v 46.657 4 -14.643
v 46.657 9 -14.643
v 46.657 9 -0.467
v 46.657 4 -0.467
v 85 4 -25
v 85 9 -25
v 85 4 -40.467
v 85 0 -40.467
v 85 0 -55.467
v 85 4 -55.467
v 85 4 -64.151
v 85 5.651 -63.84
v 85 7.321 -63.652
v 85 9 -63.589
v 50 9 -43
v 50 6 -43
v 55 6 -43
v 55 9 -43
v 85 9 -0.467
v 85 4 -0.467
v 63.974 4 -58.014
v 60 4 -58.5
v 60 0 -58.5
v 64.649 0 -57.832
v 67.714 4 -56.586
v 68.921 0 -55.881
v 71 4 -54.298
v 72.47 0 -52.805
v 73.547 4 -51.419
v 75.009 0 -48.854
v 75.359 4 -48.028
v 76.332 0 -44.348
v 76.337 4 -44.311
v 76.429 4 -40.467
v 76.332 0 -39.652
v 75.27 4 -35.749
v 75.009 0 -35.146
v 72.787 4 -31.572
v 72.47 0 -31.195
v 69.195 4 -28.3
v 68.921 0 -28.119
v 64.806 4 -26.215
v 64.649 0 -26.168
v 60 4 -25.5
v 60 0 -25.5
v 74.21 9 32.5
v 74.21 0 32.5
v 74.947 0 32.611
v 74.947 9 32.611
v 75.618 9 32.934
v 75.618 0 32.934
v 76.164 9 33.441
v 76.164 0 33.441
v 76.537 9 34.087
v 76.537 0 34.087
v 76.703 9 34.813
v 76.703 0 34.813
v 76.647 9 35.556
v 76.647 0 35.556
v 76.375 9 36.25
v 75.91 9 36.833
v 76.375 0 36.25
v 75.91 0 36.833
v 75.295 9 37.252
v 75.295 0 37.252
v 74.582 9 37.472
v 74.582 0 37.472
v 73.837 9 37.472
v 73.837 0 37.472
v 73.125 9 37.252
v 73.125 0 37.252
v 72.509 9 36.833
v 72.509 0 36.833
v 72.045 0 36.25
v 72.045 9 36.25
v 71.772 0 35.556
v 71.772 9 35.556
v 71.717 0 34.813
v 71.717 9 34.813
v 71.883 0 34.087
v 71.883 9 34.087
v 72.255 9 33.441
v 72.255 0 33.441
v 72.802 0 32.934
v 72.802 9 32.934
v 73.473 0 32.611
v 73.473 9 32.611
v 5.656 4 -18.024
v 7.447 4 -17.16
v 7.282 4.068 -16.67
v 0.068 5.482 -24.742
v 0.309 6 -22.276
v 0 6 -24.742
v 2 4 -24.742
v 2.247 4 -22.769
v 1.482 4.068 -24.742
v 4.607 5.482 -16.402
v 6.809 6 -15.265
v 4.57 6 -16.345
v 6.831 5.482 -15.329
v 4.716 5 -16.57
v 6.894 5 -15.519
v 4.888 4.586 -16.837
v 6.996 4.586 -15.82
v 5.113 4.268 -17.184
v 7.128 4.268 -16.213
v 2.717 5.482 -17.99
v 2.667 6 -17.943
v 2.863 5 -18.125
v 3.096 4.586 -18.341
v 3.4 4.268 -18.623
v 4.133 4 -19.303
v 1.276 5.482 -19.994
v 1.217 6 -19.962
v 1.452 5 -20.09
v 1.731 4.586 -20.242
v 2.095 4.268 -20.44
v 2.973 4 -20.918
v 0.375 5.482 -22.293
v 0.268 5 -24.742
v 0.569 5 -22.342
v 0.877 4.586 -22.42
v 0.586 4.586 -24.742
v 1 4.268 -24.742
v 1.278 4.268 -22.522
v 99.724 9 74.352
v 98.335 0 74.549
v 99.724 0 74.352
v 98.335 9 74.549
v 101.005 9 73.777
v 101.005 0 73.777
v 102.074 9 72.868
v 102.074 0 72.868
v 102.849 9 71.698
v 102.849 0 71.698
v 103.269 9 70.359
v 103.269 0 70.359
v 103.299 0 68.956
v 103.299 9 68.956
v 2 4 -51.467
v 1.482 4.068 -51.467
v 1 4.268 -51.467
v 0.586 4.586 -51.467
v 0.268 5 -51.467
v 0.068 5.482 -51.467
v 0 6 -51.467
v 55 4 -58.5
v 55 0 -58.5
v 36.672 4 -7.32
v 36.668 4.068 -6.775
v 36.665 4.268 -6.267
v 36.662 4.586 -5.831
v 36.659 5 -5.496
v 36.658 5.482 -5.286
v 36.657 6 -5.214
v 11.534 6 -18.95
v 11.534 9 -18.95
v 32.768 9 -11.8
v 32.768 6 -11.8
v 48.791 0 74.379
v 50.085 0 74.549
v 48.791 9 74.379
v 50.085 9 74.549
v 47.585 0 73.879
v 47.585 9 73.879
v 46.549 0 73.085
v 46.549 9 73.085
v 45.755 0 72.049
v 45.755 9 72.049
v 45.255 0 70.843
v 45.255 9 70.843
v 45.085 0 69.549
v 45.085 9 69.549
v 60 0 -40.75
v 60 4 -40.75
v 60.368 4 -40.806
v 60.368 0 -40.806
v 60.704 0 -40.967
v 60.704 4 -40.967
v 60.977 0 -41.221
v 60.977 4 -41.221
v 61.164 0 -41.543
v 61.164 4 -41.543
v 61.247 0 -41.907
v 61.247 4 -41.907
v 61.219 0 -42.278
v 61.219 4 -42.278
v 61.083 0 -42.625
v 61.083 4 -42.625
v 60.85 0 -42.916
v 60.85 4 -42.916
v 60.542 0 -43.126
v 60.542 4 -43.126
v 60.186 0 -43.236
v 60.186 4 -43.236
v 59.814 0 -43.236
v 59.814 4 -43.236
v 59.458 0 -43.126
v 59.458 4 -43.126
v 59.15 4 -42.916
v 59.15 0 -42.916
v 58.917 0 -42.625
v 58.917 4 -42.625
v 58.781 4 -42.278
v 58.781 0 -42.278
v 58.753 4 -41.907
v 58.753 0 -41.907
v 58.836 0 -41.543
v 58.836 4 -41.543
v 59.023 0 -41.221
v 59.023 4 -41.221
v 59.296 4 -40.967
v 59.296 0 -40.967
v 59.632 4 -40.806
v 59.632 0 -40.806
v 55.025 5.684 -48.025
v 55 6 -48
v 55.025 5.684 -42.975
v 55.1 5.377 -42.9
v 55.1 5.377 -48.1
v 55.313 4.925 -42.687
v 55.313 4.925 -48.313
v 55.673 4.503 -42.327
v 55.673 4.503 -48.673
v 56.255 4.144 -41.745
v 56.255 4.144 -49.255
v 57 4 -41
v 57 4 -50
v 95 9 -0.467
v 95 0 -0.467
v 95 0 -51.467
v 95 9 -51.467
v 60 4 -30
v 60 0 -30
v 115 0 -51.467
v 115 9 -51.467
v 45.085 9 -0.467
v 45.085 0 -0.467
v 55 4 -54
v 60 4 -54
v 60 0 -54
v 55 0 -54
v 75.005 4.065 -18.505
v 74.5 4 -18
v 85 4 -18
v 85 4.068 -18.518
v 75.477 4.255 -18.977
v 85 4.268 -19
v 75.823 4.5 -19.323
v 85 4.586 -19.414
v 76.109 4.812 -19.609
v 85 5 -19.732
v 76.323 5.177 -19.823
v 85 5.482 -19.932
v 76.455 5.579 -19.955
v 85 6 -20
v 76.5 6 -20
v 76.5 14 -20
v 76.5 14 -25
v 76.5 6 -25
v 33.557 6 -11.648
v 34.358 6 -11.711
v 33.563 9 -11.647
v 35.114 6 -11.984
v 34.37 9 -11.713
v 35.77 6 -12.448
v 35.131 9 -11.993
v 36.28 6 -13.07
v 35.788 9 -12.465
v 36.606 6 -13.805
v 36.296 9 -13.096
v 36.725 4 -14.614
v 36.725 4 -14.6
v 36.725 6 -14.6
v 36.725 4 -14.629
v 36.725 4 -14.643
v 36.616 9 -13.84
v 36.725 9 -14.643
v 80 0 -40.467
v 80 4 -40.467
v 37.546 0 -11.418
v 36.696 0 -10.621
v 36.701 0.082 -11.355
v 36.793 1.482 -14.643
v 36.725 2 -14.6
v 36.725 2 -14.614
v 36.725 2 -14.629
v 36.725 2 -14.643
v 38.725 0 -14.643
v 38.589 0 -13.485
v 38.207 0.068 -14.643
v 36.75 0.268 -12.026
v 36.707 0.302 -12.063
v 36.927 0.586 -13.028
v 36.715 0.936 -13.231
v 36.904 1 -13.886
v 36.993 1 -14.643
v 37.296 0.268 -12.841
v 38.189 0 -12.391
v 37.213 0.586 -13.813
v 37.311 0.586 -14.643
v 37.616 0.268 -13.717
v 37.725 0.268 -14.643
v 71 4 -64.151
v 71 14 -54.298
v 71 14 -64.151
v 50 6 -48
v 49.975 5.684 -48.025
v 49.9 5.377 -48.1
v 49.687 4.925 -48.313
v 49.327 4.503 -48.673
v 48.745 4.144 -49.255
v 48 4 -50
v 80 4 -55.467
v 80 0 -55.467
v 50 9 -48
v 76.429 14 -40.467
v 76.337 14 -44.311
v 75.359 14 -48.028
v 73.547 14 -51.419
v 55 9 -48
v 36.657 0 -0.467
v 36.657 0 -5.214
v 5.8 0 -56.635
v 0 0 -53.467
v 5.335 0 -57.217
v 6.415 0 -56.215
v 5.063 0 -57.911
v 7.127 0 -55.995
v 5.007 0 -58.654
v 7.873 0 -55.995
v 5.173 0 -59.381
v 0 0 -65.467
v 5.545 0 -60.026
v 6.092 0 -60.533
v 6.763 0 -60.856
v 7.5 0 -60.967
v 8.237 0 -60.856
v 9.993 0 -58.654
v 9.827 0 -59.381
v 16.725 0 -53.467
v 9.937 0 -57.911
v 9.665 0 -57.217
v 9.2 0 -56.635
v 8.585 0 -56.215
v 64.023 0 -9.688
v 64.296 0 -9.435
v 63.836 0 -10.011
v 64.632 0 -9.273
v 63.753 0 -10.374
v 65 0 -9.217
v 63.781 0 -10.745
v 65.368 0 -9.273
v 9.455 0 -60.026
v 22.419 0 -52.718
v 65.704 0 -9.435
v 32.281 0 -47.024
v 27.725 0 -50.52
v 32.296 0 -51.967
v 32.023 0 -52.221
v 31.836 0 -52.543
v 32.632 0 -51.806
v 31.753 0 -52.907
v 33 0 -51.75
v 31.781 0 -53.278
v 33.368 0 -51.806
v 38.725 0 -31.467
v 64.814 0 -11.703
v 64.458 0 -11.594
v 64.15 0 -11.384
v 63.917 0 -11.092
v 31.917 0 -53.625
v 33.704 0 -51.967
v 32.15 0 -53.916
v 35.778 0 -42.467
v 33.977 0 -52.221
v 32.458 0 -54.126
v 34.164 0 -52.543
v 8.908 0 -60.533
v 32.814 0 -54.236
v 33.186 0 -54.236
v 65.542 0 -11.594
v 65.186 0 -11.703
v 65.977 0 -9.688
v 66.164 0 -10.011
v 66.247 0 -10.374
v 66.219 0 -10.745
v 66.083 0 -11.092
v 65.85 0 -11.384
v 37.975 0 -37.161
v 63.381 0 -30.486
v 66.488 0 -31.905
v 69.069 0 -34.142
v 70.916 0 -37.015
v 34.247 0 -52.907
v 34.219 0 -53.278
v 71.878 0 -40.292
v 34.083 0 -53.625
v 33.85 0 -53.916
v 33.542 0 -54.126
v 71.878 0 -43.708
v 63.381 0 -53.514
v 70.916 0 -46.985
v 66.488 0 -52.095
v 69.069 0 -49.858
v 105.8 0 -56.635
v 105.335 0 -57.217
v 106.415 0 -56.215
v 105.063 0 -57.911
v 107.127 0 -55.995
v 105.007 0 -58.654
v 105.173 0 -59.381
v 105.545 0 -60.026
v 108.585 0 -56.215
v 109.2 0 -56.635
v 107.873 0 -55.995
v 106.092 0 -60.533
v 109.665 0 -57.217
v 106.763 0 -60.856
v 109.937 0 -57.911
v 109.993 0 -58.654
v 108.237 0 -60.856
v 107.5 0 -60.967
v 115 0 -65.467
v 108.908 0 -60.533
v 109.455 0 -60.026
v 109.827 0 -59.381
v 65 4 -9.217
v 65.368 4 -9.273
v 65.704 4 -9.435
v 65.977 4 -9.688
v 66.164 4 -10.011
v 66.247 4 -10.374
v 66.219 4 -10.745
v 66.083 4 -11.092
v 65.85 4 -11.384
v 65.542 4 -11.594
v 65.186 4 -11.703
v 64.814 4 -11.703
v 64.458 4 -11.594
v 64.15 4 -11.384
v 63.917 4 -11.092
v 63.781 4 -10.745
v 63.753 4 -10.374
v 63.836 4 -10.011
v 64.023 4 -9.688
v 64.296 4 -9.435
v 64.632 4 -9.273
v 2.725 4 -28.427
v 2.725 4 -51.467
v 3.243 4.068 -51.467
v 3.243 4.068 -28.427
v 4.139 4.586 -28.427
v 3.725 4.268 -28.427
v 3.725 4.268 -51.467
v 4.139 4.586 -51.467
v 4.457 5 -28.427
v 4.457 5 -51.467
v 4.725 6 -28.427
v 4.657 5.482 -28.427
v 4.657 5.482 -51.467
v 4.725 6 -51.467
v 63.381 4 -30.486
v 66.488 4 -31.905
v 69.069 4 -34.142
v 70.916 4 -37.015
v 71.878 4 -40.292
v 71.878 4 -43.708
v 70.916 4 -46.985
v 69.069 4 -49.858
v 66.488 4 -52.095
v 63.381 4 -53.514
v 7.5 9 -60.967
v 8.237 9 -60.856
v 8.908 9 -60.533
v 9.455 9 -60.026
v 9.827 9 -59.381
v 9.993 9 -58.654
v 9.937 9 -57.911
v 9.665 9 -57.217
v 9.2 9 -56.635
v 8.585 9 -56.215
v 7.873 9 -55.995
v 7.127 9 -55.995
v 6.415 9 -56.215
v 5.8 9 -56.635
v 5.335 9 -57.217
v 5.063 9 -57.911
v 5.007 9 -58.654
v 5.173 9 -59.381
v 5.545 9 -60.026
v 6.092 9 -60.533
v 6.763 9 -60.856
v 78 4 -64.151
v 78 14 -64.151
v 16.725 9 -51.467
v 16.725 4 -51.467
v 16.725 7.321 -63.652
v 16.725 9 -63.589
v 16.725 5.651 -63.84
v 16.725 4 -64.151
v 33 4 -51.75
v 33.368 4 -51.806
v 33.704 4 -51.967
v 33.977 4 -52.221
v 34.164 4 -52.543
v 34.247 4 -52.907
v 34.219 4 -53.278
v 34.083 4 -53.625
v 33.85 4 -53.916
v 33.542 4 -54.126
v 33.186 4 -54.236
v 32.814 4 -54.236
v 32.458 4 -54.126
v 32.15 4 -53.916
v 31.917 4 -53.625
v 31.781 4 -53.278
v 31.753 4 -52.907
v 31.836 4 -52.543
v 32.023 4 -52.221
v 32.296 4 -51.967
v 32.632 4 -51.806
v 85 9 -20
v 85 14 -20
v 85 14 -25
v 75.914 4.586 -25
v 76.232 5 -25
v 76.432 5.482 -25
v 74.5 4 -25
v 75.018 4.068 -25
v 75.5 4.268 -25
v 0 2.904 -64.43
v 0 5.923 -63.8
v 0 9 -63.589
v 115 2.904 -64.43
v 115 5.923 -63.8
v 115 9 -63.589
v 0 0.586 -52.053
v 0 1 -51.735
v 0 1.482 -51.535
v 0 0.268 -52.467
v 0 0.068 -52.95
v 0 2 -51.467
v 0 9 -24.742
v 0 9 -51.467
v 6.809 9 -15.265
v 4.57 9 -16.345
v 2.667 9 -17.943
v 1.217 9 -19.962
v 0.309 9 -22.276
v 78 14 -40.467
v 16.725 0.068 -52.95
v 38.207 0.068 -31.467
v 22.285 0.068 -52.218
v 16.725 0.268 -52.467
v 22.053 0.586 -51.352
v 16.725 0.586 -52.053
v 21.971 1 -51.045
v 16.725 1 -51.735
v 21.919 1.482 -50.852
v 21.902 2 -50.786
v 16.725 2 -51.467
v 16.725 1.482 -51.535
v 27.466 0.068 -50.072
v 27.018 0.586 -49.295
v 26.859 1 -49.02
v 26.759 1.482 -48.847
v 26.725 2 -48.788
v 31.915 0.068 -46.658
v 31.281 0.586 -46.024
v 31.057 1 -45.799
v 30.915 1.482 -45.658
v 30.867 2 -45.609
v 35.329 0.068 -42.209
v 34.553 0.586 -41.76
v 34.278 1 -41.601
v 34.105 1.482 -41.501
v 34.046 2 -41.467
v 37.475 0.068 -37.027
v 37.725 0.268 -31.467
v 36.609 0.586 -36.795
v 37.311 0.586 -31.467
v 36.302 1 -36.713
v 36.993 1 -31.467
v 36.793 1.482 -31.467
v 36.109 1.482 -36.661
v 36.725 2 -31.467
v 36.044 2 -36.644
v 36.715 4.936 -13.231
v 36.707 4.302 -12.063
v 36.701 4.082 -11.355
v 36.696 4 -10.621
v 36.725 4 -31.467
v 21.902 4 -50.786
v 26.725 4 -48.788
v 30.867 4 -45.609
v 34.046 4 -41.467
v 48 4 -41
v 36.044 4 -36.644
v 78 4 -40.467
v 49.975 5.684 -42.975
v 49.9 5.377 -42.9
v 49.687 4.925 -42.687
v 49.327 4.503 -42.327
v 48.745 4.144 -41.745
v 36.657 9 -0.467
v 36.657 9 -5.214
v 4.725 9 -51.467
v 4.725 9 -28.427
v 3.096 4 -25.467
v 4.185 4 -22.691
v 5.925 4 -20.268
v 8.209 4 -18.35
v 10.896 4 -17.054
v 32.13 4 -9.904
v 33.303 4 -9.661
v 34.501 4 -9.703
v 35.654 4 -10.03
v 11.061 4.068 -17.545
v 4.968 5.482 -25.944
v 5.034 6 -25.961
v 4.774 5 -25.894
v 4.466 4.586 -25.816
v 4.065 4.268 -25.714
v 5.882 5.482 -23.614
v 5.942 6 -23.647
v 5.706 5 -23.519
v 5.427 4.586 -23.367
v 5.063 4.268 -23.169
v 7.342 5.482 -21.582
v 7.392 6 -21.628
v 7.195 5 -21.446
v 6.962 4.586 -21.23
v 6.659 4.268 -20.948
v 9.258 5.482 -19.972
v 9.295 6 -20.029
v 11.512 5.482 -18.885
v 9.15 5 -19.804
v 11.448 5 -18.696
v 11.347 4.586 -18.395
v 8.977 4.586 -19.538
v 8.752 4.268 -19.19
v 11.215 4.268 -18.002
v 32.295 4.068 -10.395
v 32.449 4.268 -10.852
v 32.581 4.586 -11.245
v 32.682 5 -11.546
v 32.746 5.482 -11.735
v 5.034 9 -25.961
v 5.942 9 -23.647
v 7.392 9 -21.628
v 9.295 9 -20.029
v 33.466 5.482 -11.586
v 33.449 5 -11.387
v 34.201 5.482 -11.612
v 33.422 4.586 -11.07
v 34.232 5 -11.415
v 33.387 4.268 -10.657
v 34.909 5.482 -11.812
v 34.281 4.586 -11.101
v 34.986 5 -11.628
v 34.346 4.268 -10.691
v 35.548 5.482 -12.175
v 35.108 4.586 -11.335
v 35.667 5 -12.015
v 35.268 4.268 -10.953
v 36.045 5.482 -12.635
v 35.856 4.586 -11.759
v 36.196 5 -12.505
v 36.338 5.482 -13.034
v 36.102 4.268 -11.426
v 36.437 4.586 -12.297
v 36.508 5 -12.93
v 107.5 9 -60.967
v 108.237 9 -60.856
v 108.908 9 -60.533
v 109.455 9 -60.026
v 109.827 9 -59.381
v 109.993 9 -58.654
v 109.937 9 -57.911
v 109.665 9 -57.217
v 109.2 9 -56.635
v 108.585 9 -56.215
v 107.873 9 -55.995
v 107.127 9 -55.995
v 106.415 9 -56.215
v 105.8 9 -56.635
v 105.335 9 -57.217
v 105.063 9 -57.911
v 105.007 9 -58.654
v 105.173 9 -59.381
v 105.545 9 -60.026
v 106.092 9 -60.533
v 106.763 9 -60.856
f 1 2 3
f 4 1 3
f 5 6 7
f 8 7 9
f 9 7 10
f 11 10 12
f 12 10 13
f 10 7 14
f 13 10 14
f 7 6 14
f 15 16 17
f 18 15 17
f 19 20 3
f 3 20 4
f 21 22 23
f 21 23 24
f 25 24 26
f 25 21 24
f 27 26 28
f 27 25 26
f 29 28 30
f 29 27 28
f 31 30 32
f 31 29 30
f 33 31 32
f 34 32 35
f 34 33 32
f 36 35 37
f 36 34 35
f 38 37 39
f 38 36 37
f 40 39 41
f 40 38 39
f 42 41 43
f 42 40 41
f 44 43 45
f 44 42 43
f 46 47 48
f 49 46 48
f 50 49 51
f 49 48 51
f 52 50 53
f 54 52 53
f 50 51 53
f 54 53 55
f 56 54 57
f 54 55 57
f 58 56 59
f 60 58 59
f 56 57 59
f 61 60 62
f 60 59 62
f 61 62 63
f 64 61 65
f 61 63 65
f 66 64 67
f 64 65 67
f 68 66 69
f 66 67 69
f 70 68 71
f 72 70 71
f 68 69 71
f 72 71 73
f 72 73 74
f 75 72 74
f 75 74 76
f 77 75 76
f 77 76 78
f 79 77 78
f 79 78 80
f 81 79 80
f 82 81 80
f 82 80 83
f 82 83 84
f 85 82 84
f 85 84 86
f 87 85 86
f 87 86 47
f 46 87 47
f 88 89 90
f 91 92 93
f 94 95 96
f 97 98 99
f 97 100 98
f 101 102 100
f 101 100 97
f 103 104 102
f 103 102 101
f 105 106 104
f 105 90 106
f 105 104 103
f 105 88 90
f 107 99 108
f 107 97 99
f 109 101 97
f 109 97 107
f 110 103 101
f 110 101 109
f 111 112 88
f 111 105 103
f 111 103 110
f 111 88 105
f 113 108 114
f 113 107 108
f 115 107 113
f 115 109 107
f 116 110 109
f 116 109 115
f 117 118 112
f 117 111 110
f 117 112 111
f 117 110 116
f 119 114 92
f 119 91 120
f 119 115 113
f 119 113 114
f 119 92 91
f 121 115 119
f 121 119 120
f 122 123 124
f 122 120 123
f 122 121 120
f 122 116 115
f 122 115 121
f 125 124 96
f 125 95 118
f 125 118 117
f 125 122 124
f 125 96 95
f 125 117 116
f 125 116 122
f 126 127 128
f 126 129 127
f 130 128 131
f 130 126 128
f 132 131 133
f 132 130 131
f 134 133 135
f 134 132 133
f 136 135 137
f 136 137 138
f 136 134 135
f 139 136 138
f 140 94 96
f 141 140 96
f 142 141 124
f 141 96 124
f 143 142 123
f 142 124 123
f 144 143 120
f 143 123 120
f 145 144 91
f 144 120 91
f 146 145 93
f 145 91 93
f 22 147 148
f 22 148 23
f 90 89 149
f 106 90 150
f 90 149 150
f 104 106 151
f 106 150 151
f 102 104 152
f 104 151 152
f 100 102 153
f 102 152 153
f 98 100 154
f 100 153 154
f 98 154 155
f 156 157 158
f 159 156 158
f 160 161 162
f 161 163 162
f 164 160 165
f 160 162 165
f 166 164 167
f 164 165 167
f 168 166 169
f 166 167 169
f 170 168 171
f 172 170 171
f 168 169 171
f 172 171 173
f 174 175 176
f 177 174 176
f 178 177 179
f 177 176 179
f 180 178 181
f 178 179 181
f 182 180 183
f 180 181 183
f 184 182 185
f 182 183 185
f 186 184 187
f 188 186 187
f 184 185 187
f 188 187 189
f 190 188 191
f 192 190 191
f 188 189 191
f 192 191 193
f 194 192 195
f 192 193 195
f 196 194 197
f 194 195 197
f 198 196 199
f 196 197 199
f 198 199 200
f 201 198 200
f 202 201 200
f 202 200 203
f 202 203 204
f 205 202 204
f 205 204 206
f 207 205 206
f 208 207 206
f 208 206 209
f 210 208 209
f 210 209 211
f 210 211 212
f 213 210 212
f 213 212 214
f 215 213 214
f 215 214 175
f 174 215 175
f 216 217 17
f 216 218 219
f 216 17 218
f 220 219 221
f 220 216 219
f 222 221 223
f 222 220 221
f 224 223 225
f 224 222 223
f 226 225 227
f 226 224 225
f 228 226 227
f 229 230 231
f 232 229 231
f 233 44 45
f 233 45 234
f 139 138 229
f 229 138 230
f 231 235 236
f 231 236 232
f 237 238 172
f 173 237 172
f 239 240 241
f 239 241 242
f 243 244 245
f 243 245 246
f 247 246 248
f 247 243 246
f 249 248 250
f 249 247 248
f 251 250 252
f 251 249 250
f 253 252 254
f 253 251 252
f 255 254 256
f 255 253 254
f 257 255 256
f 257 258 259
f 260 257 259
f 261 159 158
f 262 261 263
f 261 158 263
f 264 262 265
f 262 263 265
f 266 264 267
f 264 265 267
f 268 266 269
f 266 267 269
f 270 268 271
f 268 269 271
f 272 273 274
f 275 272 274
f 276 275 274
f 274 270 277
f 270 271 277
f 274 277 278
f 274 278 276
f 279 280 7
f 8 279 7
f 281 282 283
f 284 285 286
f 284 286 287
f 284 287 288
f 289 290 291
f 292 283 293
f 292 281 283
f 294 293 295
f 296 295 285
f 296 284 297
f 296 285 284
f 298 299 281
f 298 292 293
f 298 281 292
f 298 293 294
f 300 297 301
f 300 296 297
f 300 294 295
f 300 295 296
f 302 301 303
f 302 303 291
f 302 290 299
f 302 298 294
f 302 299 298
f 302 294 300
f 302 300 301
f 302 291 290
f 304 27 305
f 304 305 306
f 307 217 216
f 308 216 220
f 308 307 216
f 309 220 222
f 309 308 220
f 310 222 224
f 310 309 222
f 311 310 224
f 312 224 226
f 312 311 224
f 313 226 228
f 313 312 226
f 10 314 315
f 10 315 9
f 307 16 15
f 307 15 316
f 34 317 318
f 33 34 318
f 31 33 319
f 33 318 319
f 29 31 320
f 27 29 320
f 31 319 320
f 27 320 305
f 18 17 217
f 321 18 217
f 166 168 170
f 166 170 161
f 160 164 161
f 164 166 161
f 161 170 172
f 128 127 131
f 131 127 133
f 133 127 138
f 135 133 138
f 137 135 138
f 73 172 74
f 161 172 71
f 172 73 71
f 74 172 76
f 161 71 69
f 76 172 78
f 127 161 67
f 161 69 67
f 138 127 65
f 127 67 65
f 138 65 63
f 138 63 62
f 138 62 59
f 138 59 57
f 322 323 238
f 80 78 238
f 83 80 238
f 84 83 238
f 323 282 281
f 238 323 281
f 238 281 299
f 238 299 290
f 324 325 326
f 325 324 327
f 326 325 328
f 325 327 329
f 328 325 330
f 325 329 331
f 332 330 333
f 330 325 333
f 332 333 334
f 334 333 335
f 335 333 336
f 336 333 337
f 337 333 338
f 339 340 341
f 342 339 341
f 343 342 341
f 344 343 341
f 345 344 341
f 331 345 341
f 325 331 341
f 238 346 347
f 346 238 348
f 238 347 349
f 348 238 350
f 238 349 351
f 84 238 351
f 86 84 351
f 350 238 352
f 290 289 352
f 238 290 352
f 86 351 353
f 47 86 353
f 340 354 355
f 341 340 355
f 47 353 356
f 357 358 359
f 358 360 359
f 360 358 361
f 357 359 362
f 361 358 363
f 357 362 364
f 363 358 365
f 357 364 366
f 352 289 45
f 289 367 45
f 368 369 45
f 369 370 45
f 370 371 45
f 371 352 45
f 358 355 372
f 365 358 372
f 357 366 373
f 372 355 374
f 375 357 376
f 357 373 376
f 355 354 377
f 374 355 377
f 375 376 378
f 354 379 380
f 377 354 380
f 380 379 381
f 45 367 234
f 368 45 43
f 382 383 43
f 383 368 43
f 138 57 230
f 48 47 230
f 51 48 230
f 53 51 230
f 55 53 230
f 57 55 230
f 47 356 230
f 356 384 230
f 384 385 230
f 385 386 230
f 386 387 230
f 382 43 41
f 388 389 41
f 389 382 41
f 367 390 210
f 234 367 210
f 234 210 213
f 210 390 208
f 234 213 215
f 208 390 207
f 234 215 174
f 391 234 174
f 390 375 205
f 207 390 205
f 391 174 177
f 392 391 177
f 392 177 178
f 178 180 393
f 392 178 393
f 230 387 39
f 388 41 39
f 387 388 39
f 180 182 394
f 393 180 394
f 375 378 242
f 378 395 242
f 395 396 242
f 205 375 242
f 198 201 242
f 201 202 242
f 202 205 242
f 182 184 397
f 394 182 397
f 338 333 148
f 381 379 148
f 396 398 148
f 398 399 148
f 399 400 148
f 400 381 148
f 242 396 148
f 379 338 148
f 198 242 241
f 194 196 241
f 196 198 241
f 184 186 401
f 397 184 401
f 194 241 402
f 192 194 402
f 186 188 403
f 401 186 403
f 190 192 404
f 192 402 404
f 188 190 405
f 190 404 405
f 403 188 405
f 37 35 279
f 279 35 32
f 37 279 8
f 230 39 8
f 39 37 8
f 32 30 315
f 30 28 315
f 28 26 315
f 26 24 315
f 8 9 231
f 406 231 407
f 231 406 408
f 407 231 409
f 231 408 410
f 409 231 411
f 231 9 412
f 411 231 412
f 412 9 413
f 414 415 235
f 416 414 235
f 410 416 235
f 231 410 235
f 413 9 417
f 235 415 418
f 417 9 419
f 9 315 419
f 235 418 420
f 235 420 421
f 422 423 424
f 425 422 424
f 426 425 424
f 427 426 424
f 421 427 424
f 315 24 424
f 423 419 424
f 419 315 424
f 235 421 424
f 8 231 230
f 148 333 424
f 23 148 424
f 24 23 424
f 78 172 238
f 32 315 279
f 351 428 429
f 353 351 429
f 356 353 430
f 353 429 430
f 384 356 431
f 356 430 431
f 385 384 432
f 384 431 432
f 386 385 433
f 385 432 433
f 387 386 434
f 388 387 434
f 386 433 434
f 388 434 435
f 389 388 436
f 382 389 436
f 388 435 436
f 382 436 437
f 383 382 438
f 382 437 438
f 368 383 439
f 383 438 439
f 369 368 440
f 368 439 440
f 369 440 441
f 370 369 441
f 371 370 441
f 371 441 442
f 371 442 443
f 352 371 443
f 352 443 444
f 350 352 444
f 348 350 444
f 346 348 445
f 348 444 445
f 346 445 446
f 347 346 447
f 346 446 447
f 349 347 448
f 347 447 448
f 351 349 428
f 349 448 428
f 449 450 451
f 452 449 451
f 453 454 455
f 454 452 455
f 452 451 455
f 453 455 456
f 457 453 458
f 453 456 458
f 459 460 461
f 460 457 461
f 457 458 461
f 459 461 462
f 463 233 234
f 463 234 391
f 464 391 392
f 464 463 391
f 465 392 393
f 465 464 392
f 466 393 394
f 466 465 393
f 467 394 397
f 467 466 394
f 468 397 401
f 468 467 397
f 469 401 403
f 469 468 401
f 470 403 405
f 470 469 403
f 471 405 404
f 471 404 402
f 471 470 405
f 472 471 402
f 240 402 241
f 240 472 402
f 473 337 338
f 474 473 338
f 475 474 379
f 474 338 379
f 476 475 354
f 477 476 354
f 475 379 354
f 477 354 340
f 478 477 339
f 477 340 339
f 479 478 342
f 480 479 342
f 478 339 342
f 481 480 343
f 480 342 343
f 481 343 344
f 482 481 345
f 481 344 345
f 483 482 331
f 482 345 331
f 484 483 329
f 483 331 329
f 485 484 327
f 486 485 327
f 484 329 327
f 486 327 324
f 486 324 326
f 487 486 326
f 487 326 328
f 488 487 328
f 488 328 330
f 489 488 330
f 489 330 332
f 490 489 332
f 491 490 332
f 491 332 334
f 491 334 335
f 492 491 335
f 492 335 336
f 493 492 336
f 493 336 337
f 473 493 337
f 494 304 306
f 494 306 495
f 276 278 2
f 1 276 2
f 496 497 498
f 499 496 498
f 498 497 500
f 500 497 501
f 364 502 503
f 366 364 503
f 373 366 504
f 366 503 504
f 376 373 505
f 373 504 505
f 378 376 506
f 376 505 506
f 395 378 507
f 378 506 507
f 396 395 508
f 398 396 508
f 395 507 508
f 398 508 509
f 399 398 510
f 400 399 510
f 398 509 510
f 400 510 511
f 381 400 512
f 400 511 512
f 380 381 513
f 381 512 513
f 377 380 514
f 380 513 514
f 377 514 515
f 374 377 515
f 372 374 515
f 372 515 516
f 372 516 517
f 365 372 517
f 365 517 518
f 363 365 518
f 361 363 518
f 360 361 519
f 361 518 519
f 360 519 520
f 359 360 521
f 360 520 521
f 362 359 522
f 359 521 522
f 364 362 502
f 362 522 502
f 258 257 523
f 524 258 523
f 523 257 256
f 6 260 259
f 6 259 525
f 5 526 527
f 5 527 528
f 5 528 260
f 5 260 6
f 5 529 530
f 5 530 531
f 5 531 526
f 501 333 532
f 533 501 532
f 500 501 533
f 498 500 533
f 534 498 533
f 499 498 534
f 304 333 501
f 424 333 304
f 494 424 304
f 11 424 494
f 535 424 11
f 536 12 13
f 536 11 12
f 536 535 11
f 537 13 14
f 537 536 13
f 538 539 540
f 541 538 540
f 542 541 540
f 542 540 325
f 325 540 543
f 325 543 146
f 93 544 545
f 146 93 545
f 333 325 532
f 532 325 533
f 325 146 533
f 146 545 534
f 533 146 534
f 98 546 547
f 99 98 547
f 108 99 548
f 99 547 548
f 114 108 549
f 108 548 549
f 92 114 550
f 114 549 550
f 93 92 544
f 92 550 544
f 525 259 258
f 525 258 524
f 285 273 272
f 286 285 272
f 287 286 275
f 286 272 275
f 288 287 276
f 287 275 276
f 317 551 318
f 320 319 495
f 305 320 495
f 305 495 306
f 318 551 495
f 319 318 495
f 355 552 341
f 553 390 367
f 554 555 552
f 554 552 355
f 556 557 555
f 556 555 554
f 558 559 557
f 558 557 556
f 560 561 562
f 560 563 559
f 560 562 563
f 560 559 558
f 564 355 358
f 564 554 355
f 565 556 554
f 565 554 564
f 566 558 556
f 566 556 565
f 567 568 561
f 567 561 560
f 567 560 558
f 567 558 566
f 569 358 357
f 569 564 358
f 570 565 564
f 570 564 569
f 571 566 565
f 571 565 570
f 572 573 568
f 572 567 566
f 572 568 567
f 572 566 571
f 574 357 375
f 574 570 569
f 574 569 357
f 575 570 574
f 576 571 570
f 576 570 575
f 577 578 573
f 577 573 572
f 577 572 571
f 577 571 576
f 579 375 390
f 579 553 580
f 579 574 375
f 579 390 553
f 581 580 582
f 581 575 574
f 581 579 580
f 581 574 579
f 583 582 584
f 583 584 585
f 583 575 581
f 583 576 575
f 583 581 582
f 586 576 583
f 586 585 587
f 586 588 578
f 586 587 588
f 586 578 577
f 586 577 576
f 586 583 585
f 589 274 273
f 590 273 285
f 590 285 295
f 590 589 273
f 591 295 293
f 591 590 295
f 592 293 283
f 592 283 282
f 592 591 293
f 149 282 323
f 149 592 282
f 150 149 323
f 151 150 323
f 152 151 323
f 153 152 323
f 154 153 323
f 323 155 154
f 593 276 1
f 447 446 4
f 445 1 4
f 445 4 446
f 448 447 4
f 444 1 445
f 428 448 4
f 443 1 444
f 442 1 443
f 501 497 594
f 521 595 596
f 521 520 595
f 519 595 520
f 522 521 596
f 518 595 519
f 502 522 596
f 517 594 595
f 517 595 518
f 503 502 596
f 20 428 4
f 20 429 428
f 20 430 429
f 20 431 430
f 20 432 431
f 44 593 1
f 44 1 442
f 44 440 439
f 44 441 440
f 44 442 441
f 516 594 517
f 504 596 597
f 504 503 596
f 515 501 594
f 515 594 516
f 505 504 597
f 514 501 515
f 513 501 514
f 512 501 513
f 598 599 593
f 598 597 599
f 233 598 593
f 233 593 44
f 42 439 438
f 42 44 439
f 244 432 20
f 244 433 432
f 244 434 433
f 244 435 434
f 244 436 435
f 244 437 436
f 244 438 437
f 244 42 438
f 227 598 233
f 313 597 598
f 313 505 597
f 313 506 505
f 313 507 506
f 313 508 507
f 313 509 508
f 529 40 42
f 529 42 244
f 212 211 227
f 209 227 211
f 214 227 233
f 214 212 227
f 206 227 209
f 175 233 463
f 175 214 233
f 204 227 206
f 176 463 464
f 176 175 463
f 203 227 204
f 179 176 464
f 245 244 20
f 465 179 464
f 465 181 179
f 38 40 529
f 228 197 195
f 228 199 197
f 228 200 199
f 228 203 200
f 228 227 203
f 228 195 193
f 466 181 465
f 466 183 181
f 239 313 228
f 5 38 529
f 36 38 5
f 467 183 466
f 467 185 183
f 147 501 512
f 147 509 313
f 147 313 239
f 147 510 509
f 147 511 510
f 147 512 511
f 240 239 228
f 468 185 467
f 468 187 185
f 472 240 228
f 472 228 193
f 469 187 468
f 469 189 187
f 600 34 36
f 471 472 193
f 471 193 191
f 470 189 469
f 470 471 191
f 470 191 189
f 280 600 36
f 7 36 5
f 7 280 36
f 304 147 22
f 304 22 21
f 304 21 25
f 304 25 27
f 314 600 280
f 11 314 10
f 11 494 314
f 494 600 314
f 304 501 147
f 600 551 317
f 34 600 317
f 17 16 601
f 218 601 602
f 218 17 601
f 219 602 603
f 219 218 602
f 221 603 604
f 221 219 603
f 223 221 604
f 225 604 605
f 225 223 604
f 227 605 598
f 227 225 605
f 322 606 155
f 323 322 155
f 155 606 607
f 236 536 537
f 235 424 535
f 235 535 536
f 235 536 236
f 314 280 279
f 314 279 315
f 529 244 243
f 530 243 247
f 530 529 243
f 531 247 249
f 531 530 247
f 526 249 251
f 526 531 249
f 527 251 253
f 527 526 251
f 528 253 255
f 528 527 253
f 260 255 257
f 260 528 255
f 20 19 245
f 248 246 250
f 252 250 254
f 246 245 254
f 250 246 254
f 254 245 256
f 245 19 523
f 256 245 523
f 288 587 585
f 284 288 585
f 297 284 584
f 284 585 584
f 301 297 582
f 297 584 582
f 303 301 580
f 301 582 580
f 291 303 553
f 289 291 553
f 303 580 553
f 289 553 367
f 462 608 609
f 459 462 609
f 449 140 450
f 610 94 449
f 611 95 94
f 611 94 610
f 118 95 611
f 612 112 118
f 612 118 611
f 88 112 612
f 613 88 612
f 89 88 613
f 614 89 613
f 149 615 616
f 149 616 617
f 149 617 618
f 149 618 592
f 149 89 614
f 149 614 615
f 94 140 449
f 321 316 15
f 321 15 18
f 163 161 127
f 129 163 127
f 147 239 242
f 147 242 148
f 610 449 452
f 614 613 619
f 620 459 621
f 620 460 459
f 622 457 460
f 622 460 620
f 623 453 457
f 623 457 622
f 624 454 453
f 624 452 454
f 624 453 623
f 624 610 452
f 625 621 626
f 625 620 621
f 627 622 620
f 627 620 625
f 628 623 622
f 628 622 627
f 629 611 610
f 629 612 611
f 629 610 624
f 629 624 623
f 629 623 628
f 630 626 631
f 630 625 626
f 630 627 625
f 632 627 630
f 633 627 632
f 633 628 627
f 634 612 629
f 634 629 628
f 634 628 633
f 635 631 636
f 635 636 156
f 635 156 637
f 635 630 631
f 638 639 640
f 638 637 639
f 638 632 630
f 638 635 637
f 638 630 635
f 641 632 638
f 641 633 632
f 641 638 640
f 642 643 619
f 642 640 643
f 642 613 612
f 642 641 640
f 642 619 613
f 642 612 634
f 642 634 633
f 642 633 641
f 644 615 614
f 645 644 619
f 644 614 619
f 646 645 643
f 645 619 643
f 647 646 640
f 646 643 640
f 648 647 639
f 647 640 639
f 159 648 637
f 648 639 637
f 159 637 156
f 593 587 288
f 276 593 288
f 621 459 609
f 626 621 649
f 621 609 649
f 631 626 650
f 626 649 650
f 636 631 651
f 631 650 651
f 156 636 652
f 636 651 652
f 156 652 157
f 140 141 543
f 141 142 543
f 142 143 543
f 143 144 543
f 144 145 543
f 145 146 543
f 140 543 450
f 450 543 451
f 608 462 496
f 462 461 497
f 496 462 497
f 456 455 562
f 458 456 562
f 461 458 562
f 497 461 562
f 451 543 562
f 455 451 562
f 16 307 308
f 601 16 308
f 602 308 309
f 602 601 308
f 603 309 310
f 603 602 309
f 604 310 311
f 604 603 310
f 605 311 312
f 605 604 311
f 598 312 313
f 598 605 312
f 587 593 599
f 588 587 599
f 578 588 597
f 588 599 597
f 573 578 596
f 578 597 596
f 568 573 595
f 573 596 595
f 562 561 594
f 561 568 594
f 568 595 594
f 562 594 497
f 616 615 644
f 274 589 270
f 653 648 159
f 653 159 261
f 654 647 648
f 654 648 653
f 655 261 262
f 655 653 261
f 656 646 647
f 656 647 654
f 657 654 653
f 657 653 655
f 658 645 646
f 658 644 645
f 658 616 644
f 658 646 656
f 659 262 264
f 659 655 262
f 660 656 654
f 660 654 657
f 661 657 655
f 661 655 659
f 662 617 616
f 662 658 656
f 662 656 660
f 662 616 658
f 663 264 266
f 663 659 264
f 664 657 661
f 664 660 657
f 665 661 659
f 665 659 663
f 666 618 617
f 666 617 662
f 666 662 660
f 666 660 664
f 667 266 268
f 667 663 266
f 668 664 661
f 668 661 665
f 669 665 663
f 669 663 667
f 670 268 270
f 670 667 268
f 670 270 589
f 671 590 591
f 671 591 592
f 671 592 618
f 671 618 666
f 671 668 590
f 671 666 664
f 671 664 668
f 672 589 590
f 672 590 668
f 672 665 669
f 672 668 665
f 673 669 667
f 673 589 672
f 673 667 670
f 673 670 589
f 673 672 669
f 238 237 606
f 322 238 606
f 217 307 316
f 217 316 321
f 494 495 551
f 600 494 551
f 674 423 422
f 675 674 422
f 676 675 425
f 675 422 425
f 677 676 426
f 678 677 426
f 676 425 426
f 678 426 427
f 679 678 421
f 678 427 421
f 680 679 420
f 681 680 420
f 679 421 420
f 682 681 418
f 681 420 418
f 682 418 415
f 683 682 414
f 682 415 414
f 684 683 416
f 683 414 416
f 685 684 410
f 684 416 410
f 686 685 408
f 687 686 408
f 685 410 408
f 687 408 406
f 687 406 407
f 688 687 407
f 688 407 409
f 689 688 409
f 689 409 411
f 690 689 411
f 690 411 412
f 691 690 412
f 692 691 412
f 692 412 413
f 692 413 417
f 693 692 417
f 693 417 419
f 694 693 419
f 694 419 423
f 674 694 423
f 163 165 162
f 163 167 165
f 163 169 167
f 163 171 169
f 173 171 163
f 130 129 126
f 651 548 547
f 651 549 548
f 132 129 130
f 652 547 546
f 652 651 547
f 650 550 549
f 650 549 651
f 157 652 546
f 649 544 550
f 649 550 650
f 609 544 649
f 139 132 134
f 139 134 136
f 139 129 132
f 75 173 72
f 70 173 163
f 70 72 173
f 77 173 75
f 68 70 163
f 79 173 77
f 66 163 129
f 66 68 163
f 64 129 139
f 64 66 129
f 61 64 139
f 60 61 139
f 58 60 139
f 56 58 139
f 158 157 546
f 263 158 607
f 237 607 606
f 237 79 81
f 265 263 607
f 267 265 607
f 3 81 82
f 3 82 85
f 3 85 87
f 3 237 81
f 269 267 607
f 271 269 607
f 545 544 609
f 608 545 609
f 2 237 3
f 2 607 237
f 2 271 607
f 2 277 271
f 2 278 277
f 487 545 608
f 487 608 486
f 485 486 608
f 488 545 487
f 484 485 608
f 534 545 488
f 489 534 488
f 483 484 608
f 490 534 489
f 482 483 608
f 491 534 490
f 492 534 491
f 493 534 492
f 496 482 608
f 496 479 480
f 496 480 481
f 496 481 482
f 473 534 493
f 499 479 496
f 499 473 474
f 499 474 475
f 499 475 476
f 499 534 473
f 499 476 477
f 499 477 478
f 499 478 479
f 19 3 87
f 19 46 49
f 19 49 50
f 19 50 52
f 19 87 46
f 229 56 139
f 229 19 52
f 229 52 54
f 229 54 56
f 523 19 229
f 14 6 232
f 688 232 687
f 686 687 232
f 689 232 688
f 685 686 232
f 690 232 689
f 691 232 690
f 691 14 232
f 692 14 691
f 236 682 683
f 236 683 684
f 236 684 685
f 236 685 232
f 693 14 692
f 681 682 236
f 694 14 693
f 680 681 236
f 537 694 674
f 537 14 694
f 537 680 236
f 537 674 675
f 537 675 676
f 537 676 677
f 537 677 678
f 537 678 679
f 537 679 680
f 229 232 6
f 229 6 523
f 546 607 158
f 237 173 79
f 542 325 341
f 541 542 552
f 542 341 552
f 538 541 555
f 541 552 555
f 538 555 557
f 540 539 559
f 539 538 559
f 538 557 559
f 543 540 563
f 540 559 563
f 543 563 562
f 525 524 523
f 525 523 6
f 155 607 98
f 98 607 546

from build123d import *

# Parameters (mm, degrees)
SALIENTE_EXTRUIR1_DEPTH  = 4
REDONDEO1_R              = 20
REDONDEO2_R              = 10
REDONDEO3_R              = 3
CROQUIS2_R               = 1.25
CORTAR_EXTRUIR1_DEPTH    = 4
SALIENTE_EXTRUIR2_DEPTH  = 9
CROQUIS4_W               = 16.725121099
CROQUIS4_H               = 14
SALIENTE_EXTRUIR3_DEPTH  = 5
SALIENTE_EXTRUIR4_DEPTH  = 5
CORTAR_EXTRUIR2_START    = -4
CORTAR_EXTRUIR2_DEPTH    = 4
SALIENTE_EXTRUIR8_DEPTH  = 9
REDONDEO4_R              = 5
CORTAR_EXTRUIR3_DEPTH    = 115
CROQUIS11_R              = 2.5
CORTAR_EXTRUIR4_DEPTH    = 10
CROQUIS12_W              = 5
CROQUIS12_H              = 5
SALIENTE_EXTRUIR9_DEPTH  = 5
CROQUIS13_R              = 1.25
CROQUIS13_W              = 5
CROQUIS13_H              = 15
CORTAR_EXTRUIR5_DEPTH    = 10
SALIENTE_EXTRUIR10_START = 10
CROQUIS14_W              = 8.5
CROQUIS14_H              = 5
SALIENTE_EXTRUIR10_DEPTH = 10
REDONDEO5_R              = 2


with BuildPart() as part:
    # Croquis1 → Saliente-Extruir1 (new body)
    with BuildSketch(Plane(origin=(0, 0, 0), x_dir=(1, 0, 0), z_dir=(0, 1, 0))):
        Polygon((36.657146199, 0.467319271), (95, 0.467319271), (95, 65.467319271), (0, 65.467319271), (0, 17.557539605), (36.657146199, 5.214366653), align=None)
        Polygon((4.725121099, 51.467319271), (36.725121099, 51.467319271), (36.725121099, 10.467319271), (4.725121099, 21.242340663), align=None, mode=Mode.SUBTRACT)
    extrude(amount=SALIENTE_EXTRUIR1_DEPTH)

    # Redondeo1
    redondeo1_edges = [part.edges().sort_by_distance(p)[0] for p in [
        (36.725121099, 2, -51.467319271),
    ]]
    fillet(redondeo1_edges, radius=REDONDEO1_R)

    # Redondeo2
    redondeo2_edges = [part.edges().sort_by_distance(p)[0] for p in [
        (0, 2, -17.557539605),
        (4.725121099, 2, -21.242340663),
    ]]
    fillet(redondeo2_edges, radius=REDONDEO2_R)

    # Redondeo3
    redondeo3_edges = [part.edges().sort_by_distance(p)[0] for p in [
        (36.725121099, 2, -10.467319271),
    ]]
    fillet(redondeo3_edges, radius=REDONDEO3_R)

    # Croquis2 → Cortar-Extruir1 (cut)
    with BuildSketch(Plane(origin=(0, 4, 0), x_dir=(1, 0, 0), z_dir=(0, 1, 0))):
        with Locations(Location((33, 53, 0), (0, 0, 270))):
            Circle(CROQUIS2_R)
        with Locations(Location((65, 10.467319271, 0), (0, 0, 270))):
            Circle(CROQUIS2_R)
    extrude(amount=-CORTAR_EXTRUIR1_DEPTH, mode=Mode.SUBTRACT)

    # Croquis3 → Saliente-Extruir2 (add)
    with BuildSketch(Plane(origin=(0, 0, 0), x_dir=(1, 0, 0), z_dir=(0, 1, 0))):
        Polygon((115, 65.467319271), (115, 51.467319271), (95, 51.467319271), (95, 0.467319271), (85, 0.467319271), (85, 65.467319271), align=None)
    extrude(amount=SALIENTE_EXTRUIR2_DEPTH)

    # Croquis4 → Saliente-Extruir3 (add)
    with BuildSketch(Plane(origin=(0, 4, 0), x_dir=(1, 0, 0), z_dir=(0, 1, 0))):
        with Locations((8.36256055, 58.467319271)):
            Rectangle(CROQUIS4_W, CROQUIS4_H)
    extrude(amount=SALIENTE_EXTRUIR3_DEPTH)

    # Croquis5 → Saliente-Extruir4 (add)
    with BuildSketch(Plane(origin=(0, 9, 0), x_dir=(1, 0, 0), z_dir=(0, 1, 0))):
        with BuildLine():
            Line((11.533976664, 18.949666776), (32.767777769, 11.799833616))
            ThreePointArc((32.767777769, 11.799833616), (35.475545335, 12.206588327), (36.725121099, 14.642982178))
            Line((36.725121099, 14.642982178), (46.657146199, 14.642982178))
            Line((46.657146199, 14.642982178), (46.657146199, 0.467319271))
            Line((46.657146199, 0.467319271), (36.657146199, 0.467319271))
            Line((36.657146199, 0.467319271), (36.657146199, 5.214366653))
            Line((36.657146199, 5.214366653), (6.808855565, 15.264865719))
            ThreePointArc((6.808855565, 15.264865719), (1.878687164, 18.907280142), (0, 24.742027593))
            Line((0, 24.742027593), (0, 51.467319271))
            Line((0, 51.467319271), (4.725121099, 51.467319271))
            Line((4.725121099, 51.467319271), (4.725121099, 28.426828651))
            ThreePointArc((4.725121099, 28.426828651), (6.603808263, 22.592081199), (11.533976664, 18.949666776))
        make_face()
    extrude(amount=-SALIENTE_EXTRUIR4_DEPTH)

    # Cortar-Extruir2: read off the stored shape, not the designer's step
    # Cortar-Extruir2 outline → Cortar-Extruir2 (cut)
    with BuildSketch(Plane.XZ.offset(CORTAR_EXTRUIR2_START)):
        with BuildLine():
            Line((0, -51.467319271), (4.725121099, -51.467319271))
            Line((4.725121099, -51.467319271), (4.725121099, -28.426828651))
            ThreePointArc((4.725121099, -28.426828651), (6.603808263, -22.592081199), (11.533976664, -18.949666776))
            Line((11.533976664, -18.949666776), (32.767777769, -11.799833616))
            ThreePointArc((32.767777769, -11.799833616), (35.457935304, -12.194032416), (36.72480926, -14.599727874))
            Line((36.72480926, -14.599727874), (36.657146199, -5.214366653))
            Line((36.657146199, -5.214366653), (6.808855565, -15.264865719))
            ThreePointArc((6.808855565, -15.264865719), (1.878687164, -18.907280142), (0, -24.742027593))
            Line((0, -24.742027593), (0, -51.467319271))
        make_face()
    extrude(amount=CORTAR_EXTRUIR2_DEPTH, mode=Mode.SUBTRACT)

    # Croquis8 → Saliente-Extruir8 (add)
    with BuildSketch(Plane(origin=(0, 0, 0), x_dir=(1, 0, 0), z_dir=(0, 1, 0))):
        Polygon((45.084767614, -74.549161415), (103.968184017, -74.549161415), (95, 0.467319271), (85, 0.467319271), (46.657146199, 0.467319271), (45.084767614, 0.467319271), align=None)
    extrude(amount=SALIENTE_EXTRUIR8_DEPTH)

    # Redondeo4
    redondeo4_edges = [part.edges().sort_by_distance(p)[0] for p in [
        (45.084767614, 4.5, 74.549161415),
        (103.968184017, 4.5, 74.549161415),
    ]]
    fillet(redondeo4_edges, radius=REDONDEO4_R)

    # Croquis10 → Cortar-Extruir3 (cut)
    with BuildSketch(Plane(origin=(115, 0, 0), x_dir=(0, 0, -1), z_dir=(1, 0, 0))):
        with BuildLine():
            Line((65.467319271, 9), (65.467319271, 0))
            ThreePointArc((65.467319271, 0), (64.063517857, 4.403033017), (63.588909898, 9))
            Line((63.588909898, 9), (65.467319271, 9))
        make_face()
    extrude(amount=-CORTAR_EXTRUIR3_DEPTH, mode=Mode.SUBTRACT)

    # Croquis11 → Cortar-Extruir4 (cut)
    with BuildSketch(Plane.XZ):
        with Locations(Location((7.5, -58.467319271, 0), (0, 0, 270))):
            Circle(CROQUIS11_R)
        with Locations(Location((107.5, -58.467319271, 0), (0, 0, 270))):
            Circle(CROQUIS11_R)
        with Locations(Location((74.209800295, 35, 0), (0, 0, 270))):
            Circle(CROQUIS11_R)
    extrude(amount=-CORTAR_EXTRUIR4_DEPTH, mode=Mode.SUBTRACT)

    # Croquis12 → Saliente-Extruir9 (add)
    with BuildSketch(Plane(origin=(0, 4, 0), x_dir=(1, 0, 0), z_dir=(0, 1, 0))):
        with Locations((52.5, 45.5)):
            Rectangle(CROQUIS12_W, CROQUIS12_H)
    extrude(amount=SALIENTE_EXTRUIR9_DEPTH)

    # Croquis13 → Cortar-Extruir5 (cut)
    with BuildSketch(Plane(origin=(0, 4, 0), x_dir=(1, 0, 0), z_dir=(0, 1, 0))):
        with Locations(Location((60, 42, 0), (0, 0, 270))):
            Circle(CROQUIS13_R)
        with BuildLine():
            Line((60, 25.5), (60, 30))
            ThreePointArc((60, 30), (72, 42), (60, 54))
            Line((60, 54), (55, 54))
            Line((55, 54), (55, 58.5))
            Line((55, 58.5), (60, 58.5))
            ThreePointArc((60, 58.5), (76.5, 42), (60, 25.5))
        make_face()
        with Locations((82.5, 47.967319271)):
            Rectangle(CROQUIS13_W, CROQUIS13_H)
    extrude(amount=-CORTAR_EXTRUIR5_DEPTH, mode=Mode.SUBTRACT)

    # Croquis14 → Saliente-Extruir10 (add)
    with BuildSketch(Plane(origin=(0, 4, 0), x_dir=(1, 0, 0), z_dir=(0, 1, 0)).offset(SALIENTE_EXTRUIR10_START)):
        with BuildLine():
            Line((78, 40.467319271), (76.42866062, 40.467319271))
            ThreePointArc((76.42866062, 40.467319271), (75.359276472, 48.028484575), (71, 54.298373876))
            Line((71, 54.298373876), (71, 64.151498929))
            Line((71, 64.151498929), (78, 64.151498929))
            Line((78, 64.151498929), (78, 40.467319271))
        make_face()
        with Locations((80.75, 22.5)):
            Rectangle(CROQUIS14_W, CROQUIS14_H)
    extrude(amount=-SALIENTE_EXTRUIR10_DEPTH)

    # Redondeo5
    # the kernel refuses this fillet: 2 mm, written as the material it adds along each edge
    with BuildSketch(Plane(origin=(50, 4, -43), x_dir=(-1, 0, 0), z_dir=(0, 0, -1)), Plane(origin=(55, 4, -43), x_dir=(0, 0, 1), z_dir=(-1, 0, 0)), Plane(origin=(55, 4, -48), x_dir=(1, 0, 0), z_dir=(0, 0, 1)), Plane(origin=(50, 4, -48), x_dir=(0, 0, -1), z_dir=(1, 0, 0))) as redondeo5_piece_1:
        with BuildLine():
            CenterArc((REDONDEO5_R, REDONDEO5_R), REDONDEO5_R, 180, 90)
            Line((0, REDONDEO5_R), (0, 0))
            Line((0, 0), (REDONDEO5_R, 0))
        make_face()
    extrude(amount=5)
    with BuildSketch(Plane(origin=(76.5, 4, -25), x_dir=(-1, 0, 0), z_dir=(0, 0, 1))) as redondeo5_piece_2:
        with BuildLine():
            CenterArc((REDONDEO5_R, -REDONDEO5_R), REDONDEO5_R, 90, 90)
            Line((0, -REDONDEO5_R), (0, 0))
            Line((0, 0), (REDONDEO5_R, 0))
        make_face()
    extrude(amount=5)
    with BuildSketch(Plane(origin=(76.5, 4, -20), x_dir=(0, 0, 1), z_dir=(1, 0, 0))) as redondeo5_piece_3:
        with BuildLine():
            CenterArc((REDONDEO5_R, -REDONDEO5_R), REDONDEO5_R, 90, 90)
            Line((0, -REDONDEO5_R), (0, 0))
            Line((0, 0), (REDONDEO5_R, 0))
        make_face()
    extrude(amount=13.5)
    with BuildSketch(Plane(origin=(50, 4, -38), x_dir=(-1, 0, 0), z_dir=(0, 0, -1))) as redondeo5_piece_4a_section:
        with BuildLine():
            CenterArc((REDONDEO5_R, REDONDEO5_R), REDONDEO5_R, 180, 90)
            Line((0, REDONDEO5_R), (0, 0))
            Line((0, 0), (REDONDEO5_R, 0))
        make_face()
    redondeo5_piece_4a = extrude(amount=10, mode=Mode.PRIVATE)
    redondeo5_piece_4a = split(redondeo5_piece_4a, bisect_by=Plane(origin=(50, 4, -43), z_dir=(0, 0, 1)), keep=Keep.TOP, mode=Mode.PRIVATE)
    with BuildSketch(Plane(origin=(55, 4, -43), x_dir=(0, 0, 1), z_dir=(-1, 0, 0))) as redondeo5_piece_4b_section:
        with BuildLine():
            CenterArc((REDONDEO5_R, REDONDEO5_R), REDONDEO5_R, 180, 90)
            Line((0, REDONDEO5_R), (0, 0))
            Line((0, 0), (REDONDEO5_R, 0))
        make_face()
    redondeo5_piece_4b = extrude(amount=10, mode=Mode.PRIVATE)
    redondeo5_piece_4b = split(redondeo5_piece_4b, bisect_by=Plane(origin=(50, 4, -43), z_dir=(-1, 0, 0)), keep=Keep.TOP, mode=Mode.PRIVATE)
    redondeo5_piece_4 = redondeo5_piece_4a & redondeo5_piece_4b
    add(redondeo5_piece_4)
    with BuildSketch(Plane(origin=(50, 4, -43), x_dir=(-1, 0, 0), z_dir=(0, 0, -1))) as redondeo5_piece_5a_section:
        with BuildLine():
            CenterArc((REDONDEO5_R, REDONDEO5_R), REDONDEO5_R, 180, 90)
            Line((0, REDONDEO5_R), (0, 0))
            Line((0, 0), (REDONDEO5_R, 0))
        make_face()
    redondeo5_piece_5a = extrude(amount=10, mode=Mode.PRIVATE)
    redondeo5_piece_5a = split(redondeo5_piece_5a, bisect_by=Plane(origin=(50, 4, -48), z_dir=(0, 0, -1)), keep=Keep.TOP, mode=Mode.PRIVATE)
    with BuildSketch(Plane(origin=(45, 4, -48), x_dir=(0, 0, -1), z_dir=(1, 0, 0))) as redondeo5_piece_5b_section:
        with BuildLine():
            CenterArc((REDONDEO5_R, REDONDEO5_R), REDONDEO5_R, 180, 90)
            Line((0, REDONDEO5_R), (0, 0))
            Line((0, 0), (REDONDEO5_R, 0))
        make_face()
    redondeo5_piece_5b = extrude(amount=10, mode=Mode.PRIVATE)
    redondeo5_piece_5b = split(redondeo5_piece_5b, bisect_by=Plane(origin=(50, 4, -48), z_dir=(-1, 0, 0)), keep=Keep.TOP, mode=Mode.PRIVATE)
    redondeo5_piece_5 = redondeo5_piece_5a & redondeo5_piece_5b
    add(redondeo5_piece_5)
    with BuildSketch(Plane(origin=(60, 4, -43), x_dir=(0, 0, 1), z_dir=(-1, 0, 0))) as redondeo5_piece_6a_section:
        with BuildLine():
            CenterArc((REDONDEO5_R, REDONDEO5_R), REDONDEO5_R, 180, 90)
            Line((0, REDONDEO5_R), (0, 0))
            Line((0, 0), (REDONDEO5_R, 0))
        make_face()
    redondeo5_piece_6a = extrude(amount=10, mode=Mode.PRIVATE)
    redondeo5_piece_6a = redondeo5_piece_6a - Plane(origin=(60, 4, -42), x_dir=(0, 0, 1), z_dir=(0, 1, 0)) * Cylinder(1.25, 28, mode=Mode.PRIVATE)
    redondeo5_piece_6a = split(redondeo5_piece_6a, bisect_by=Plane(origin=(55, 4, -43), z_dir=(1, 0, 0)), keep=Keep.TOP, mode=Mode.PRIVATE)
    with BuildSketch(Plane(origin=(55, 4, -48), x_dir=(1, 0, 0), z_dir=(0, 0, 1))) as redondeo5_piece_6b_section:
        with BuildLine():
            CenterArc((REDONDEO5_R, REDONDEO5_R), REDONDEO5_R, 180, 90)
            Line((0, REDONDEO5_R), (0, 0))
            Line((0, 0), (REDONDEO5_R, 0))
        make_face()
    redondeo5_piece_6b = extrude(amount=10, mode=Mode.PRIVATE)
    redondeo5_piece_6b = split(redondeo5_piece_6b, bisect_by=Plane(origin=(55, 4, -43), z_dir=(0, 0, 1)), keep=Keep.TOP, mode=Mode.PRIVATE)
    redondeo5_piece_6 = redondeo5_piece_6a & redondeo5_piece_6b
    add(redondeo5_piece_6)
    with BuildSketch(Plane(origin=(50, 4, -48), x_dir=(0, 0, -1), z_dir=(1, 0, 0))) as redondeo5_piece_7a_section:
        with BuildLine():
            CenterArc((REDONDEO5_R, REDONDEO5_R), REDONDEO5_R, 180, 90)
            Line((0, REDONDEO5_R), (0, 0))
            Line((0, 0), (REDONDEO5_R, 0))
        make_face()
    redondeo5_piece_7a = extrude(amount=10, mode=Mode.PRIVATE)
    redondeo5_piece_7a = split(redondeo5_piece_7a, bisect_by=Plane(origin=(55, 4, -48), z_dir=(1, 0, 0)), keep=Keep.TOP, mode=Mode.PRIVATE)
    with BuildSketch(Plane(origin=(55, 4, -53), x_dir=(1, 0, 0), z_dir=(0, 0, 1))) as redondeo5_piece_7b_section:
        with BuildLine():
            CenterArc((REDONDEO5_R, REDONDEO5_R), REDONDEO5_R, 180, 90)
            Line((0, REDONDEO5_R), (0, 0))
            Line((0, 0), (REDONDEO5_R, 0))
        make_face()
    redondeo5_piece_7b = extrude(amount=10, mode=Mode.PRIVATE)
    redondeo5_piece_7b = split(redondeo5_piece_7b, bisect_by=Plane(origin=(55, 4, -48), z_dir=(0, 0, -1)), keep=Keep.TOP, mode=Mode.PRIVATE)
    redondeo5_piece_7 = redondeo5_piece_7a & redondeo5_piece_7b
    add(redondeo5_piece_7)
    with BuildSketch(Plane(origin=(76.5, 4, -25), x_dir=(-1, 0, 0), z_dir=(0, 0, 1))) as redondeo5_piece_8a_section:
        with BuildLine():
            CenterArc((REDONDEO5_R, -REDONDEO5_R), REDONDEO5_R, 90, 90)
            Line((0, -REDONDEO5_R), (0, 0))
            Line((0, 0), (REDONDEO5_R, 0))
        make_face()
    redondeo5_piece_8a = extrude(amount=10, mode=Mode.PRIVATE)
    redondeo5_piece_8a = split(redondeo5_piece_8a, bisect_by=Plane(origin=(76.5, 4, -20), z_dir=(0, 0, 1)), keep=Keep.TOP, mode=Mode.PRIVATE)
    with BuildSketch(Plane(origin=(71.5, 4, -20), x_dir=(0, 0, 1), z_dir=(1, 0, 0))) as redondeo5_piece_8b_section:
        with BuildLine():
            CenterArc((REDONDEO5_R, -REDONDEO5_R), REDONDEO5_R, 90, 90)
            Line((0, -REDONDEO5_R), (0, 0))
            Line((0, 0), (REDONDEO5_R, 0))
        make_face()
    redondeo5_piece_8b = extrude(amount=13.5, mode=Mode.PRIVATE)
    redondeo5_piece_8b = split(redondeo5_piece_8b, bisect_by=Plane(origin=(76.5, 4, -20), z_dir=(-1, 0, 0)), keep=Keep.TOP, mode=Mode.PRIVATE)
    redondeo5_piece_8 = redondeo5_piece_8a & redondeo5_piece_8b
    add(redondeo5_piece_8)
    # the kernel refuses this fillet: 2 mm, written as the material it takes off along each edge
    with BuildSketch(Plane(origin=(33.725121099, 0, -14.642982178), x_dir=(-0.11006554678443577, 0, 0.9939243308275753), z_dir=(-0.9939243308275753, 0, -0.11006554678443577))) as redondeo5_2_piece_1:
        with BuildLine():
            CenterArc((3 + REDONDEO5_R, REDONDEO5_R), REDONDEO5_R, 180, 90)
            Line((3, REDONDEO5_R), (3, 0))
            Line((3, 0), (3 + REDONDEO5_R, 0))
        make_face()
    revolve(axis=Axis((33.725121099, 0, -14.642982178), (0, 1, 0)), revolution_arc=96.319094067, mode=Mode.SUBTRACT)
    with BuildSketch(Plane(origin=(33.725121101, 4, -14.642982175), x_dir=(-0.31911444425993896, 0, 0.9477161871914347), z_dir=(-0.9477161871914347, 0, -0.31911444425993896))) as redondeo5_2_piece_2_section:
        with BuildLine():
            CenterArc((2.999999998 + REDONDEO5_R, REDONDEO5_R), REDONDEO5_R, 180, 90)
            Line((2.999999998 - REDONDEO5_R * 4.36444880236e-10, REDONDEO5_R), (2.999999998, 0))
            Line((2.999999998, 0), (2.999999998 + REDONDEO5_R, 0))
        make_face()
    redondeo5_2_piece_2 = revolve(axis=Axis((33.725121101, 4, -14.642982175), (0, 1, 0)), revolution_arc=203.331243748, mode=Mode.PRIVATE)
    redondeo5_2_piece_2 = split(redondeo5_2_piece_2, bisect_by=Plane(origin=(36.724965179, 4, -14.621355023), z_dir=(-0.9999740131061556, 0, -0.007209237988178882)), keep=Keep.TOP, mode=Mode.PRIVATE)
    add(redondeo5_2_piece_2, mode=Mode.SUBTRACT)
    with BuildSketch(Plane(origin=(11.533976664, 4, -18.949666776), x_dir=(-0.3191144435113306, 0, 0.9477161874435056), z_dir=(0.9477161874435056, 0, 0.3191144435113306))) as redondeo5_2_piece_3:
        with BuildLine():
            CenterArc((REDONDEO5_R, -REDONDEO5_R), REDONDEO5_R, 90, 90)
            Line((0, -REDONDEO5_R), (0, 0))
            Line((0, 0), (REDONDEO5_R, 0))
        make_face()
    extrude(amount=22.405232058, mode=Mode.SUBTRACT)
    with BuildSketch(Plane(origin=(14.725121098, 4, -28.42682865), x_dir=(-1.0, 0, -9.385345834372306e-11), z_dir=(9.385345834372306e-11, 0, -1.0))) as redondeo5_2_piece_4:
        with BuildLine():
            CenterArc((9.999999999 + REDONDEO5_R, REDONDEO5_R), REDONDEO5_R, 180, 90)
            Line((9.999999999 - REDONDEO5_R * 2.13431050611e-10, REDONDEO5_R), (9.999999999, 0))
            Line((9.999999999, 0), (9.999999999 + REDONDEO5_R, 0))
        make_face()
    revolve(axis=Axis((14.725121098, 4, -28.42682865), (0, 1, 0)), revolution_arc=71.390621366, mode=Mode.SUBTRACT)
    with BuildSketch(Plane(origin=(4.725121099, 4, -51.467319271), x_dir=(1.166040597411211e-10, 1.0, 0), z_dir=(0, 0, 1))) as redondeo5_2_piece_5:
        with BuildLine():
            CenterArc((REDONDEO5_R, REDONDEO5_R), REDONDEO5_R, 180.000000007, 90)
            Line((-REDONDEO5_R * 1.16604059728e-10, REDONDEO5_R), (0, 0))
            Line((0, 0), (REDONDEO5_R, 0))
        make_face()
    extrude(amount=23.04049062, mode=Mode.SUBTRACT)
    with BuildSketch(Plane(origin=(0, 4, -24.742027593), x_dir=(1, 0, 0), z_dir=(0, 0, -1))) as redondeo5_2_piece_6:
        with BuildLine():
            CenterArc((REDONDEO5_R, -REDONDEO5_R), REDONDEO5_R, 90, 90)
            Line((0, -REDONDEO5_R), (0, 0))
            Line((0, 0), (REDONDEO5_R, 0))
        make_face()
    extrude(amount=26.725291678, mode=Mode.SUBTRACT)
    with BuildSketch(Plane(origin=(9.999999999, 4, -24.742027593), x_dir=(-0.3191144434609789, 0, 0.9477161874604599), z_dir=(0.9477161874604599, 0, 0.3191144434609789))) as redondeo5_2_piece_7:
        with BuildLine():
            CenterArc((9.999999999 - REDONDEO5_R, -REDONDEO5_R), REDONDEO5_R, 0, 90)
            Line((9.999999999 + REDONDEO5_R * 5.85504977835e-11, -REDONDEO5_R), (9.999999999, 0))
            Line((9.999999999, 0), (9.999999999 - REDONDEO5_R, 0))
        make_face()
    revolve(axis=Axis((9.999999999, 4, -24.742027593), (0, -1, 0)), revolution_arc=71.390621361, mode=Mode.SUBTRACT)
    with BuildSketch(Plane(origin=(41.395727136, 4, -3.618794435), x_dir=(0.31911444355046886, 0, -0.9477161874303269), z_dir=(-0.9477161874303269, 0, -0.31911444355046886))) as redondeo5_2_piece_8_section:
        with BuildLine():
            CenterArc((REDONDEO5_R, -REDONDEO5_R), REDONDEO5_R, 90, 90)
            Line((-REDONDEO5_R * 9.41127960718e-11, -REDONDEO5_R), (0, 0))
            Line((0, 0), (REDONDEO5_R, 0))
        make_face()
    redondeo5_2_piece_8 = extrude(amount=36.494967618, mode=Mode.PRIVATE)
    redondeo5_2_piece_8 = split(redondeo5_2_piece_8, bisect_by=Plane(origin=(36.645889917, 4, -3.653038032), z_dir=(-0.9999740131061556, 0, -0.007209237988178882)), keep=Keep.TOP, mode=Mode.PRIVATE)
    add(redondeo5_2_piece_8, mode=Mode.SUBTRACT)
    with BuildSketch(Plane(origin=(16.725121099, 0, -51.467319271), x_dir=(2.1424885652254232e-11, 0, -1.0), z_dir=(-1.0, 0, -2.1424885652254232e-11))) as redondeo5_2_piece_9:
        with BuildLine():
            CenterArc((REDONDEO5_R, -REDONDEO5_R), REDONDEO5_R, 90, 90)
            Line((-REDONDEO5_R * 8.95887808379e-11, -REDONDEO5_R), (0, 0))
            Line((0, 0), (REDONDEO5_R, 0))
        make_face()
    extrude(amount=21.725121099, mode=Mode.SUBTRACT)
    with BuildSketch(Plane(origin=(16.725121099, 0, -31.467319271), x_dir=(0, 0, -1), z_dir=(-1, 0, 0))) as redondeo5_2_piece_10:
        with BuildLine():
            CenterArc((20 + REDONDEO5_R, -REDONDEO5_R), REDONDEO5_R, 90, 90)
            Line((20, -REDONDEO5_R), (20, 0))
            Line((20, 0), (20 + REDONDEO5_R, 0))
        make_face()
    revolve(axis=Axis((16.725121099, 0, -31.467319271), (0, -1, 0)), revolution_arc=90, mode=Mode.SUBTRACT)
    with BuildSketch(Plane(origin=(36.725121099, 0, -31.467319271), x_dir=(1, 0, 0), z_dir=(0, 0, 1))) as redondeo5_2_piece_11:
        with BuildLine():
            CenterArc((REDONDEO5_R, REDONDEO5_R), REDONDEO5_R, 180, 90)
            Line((0, REDONDEO5_R), (0, 0))
            Line((0, 0), (REDONDEO5_R, 0))
        make_face()
    extrude(amount=16.824337093, mode=Mode.SUBTRACT)


solid = part.part
